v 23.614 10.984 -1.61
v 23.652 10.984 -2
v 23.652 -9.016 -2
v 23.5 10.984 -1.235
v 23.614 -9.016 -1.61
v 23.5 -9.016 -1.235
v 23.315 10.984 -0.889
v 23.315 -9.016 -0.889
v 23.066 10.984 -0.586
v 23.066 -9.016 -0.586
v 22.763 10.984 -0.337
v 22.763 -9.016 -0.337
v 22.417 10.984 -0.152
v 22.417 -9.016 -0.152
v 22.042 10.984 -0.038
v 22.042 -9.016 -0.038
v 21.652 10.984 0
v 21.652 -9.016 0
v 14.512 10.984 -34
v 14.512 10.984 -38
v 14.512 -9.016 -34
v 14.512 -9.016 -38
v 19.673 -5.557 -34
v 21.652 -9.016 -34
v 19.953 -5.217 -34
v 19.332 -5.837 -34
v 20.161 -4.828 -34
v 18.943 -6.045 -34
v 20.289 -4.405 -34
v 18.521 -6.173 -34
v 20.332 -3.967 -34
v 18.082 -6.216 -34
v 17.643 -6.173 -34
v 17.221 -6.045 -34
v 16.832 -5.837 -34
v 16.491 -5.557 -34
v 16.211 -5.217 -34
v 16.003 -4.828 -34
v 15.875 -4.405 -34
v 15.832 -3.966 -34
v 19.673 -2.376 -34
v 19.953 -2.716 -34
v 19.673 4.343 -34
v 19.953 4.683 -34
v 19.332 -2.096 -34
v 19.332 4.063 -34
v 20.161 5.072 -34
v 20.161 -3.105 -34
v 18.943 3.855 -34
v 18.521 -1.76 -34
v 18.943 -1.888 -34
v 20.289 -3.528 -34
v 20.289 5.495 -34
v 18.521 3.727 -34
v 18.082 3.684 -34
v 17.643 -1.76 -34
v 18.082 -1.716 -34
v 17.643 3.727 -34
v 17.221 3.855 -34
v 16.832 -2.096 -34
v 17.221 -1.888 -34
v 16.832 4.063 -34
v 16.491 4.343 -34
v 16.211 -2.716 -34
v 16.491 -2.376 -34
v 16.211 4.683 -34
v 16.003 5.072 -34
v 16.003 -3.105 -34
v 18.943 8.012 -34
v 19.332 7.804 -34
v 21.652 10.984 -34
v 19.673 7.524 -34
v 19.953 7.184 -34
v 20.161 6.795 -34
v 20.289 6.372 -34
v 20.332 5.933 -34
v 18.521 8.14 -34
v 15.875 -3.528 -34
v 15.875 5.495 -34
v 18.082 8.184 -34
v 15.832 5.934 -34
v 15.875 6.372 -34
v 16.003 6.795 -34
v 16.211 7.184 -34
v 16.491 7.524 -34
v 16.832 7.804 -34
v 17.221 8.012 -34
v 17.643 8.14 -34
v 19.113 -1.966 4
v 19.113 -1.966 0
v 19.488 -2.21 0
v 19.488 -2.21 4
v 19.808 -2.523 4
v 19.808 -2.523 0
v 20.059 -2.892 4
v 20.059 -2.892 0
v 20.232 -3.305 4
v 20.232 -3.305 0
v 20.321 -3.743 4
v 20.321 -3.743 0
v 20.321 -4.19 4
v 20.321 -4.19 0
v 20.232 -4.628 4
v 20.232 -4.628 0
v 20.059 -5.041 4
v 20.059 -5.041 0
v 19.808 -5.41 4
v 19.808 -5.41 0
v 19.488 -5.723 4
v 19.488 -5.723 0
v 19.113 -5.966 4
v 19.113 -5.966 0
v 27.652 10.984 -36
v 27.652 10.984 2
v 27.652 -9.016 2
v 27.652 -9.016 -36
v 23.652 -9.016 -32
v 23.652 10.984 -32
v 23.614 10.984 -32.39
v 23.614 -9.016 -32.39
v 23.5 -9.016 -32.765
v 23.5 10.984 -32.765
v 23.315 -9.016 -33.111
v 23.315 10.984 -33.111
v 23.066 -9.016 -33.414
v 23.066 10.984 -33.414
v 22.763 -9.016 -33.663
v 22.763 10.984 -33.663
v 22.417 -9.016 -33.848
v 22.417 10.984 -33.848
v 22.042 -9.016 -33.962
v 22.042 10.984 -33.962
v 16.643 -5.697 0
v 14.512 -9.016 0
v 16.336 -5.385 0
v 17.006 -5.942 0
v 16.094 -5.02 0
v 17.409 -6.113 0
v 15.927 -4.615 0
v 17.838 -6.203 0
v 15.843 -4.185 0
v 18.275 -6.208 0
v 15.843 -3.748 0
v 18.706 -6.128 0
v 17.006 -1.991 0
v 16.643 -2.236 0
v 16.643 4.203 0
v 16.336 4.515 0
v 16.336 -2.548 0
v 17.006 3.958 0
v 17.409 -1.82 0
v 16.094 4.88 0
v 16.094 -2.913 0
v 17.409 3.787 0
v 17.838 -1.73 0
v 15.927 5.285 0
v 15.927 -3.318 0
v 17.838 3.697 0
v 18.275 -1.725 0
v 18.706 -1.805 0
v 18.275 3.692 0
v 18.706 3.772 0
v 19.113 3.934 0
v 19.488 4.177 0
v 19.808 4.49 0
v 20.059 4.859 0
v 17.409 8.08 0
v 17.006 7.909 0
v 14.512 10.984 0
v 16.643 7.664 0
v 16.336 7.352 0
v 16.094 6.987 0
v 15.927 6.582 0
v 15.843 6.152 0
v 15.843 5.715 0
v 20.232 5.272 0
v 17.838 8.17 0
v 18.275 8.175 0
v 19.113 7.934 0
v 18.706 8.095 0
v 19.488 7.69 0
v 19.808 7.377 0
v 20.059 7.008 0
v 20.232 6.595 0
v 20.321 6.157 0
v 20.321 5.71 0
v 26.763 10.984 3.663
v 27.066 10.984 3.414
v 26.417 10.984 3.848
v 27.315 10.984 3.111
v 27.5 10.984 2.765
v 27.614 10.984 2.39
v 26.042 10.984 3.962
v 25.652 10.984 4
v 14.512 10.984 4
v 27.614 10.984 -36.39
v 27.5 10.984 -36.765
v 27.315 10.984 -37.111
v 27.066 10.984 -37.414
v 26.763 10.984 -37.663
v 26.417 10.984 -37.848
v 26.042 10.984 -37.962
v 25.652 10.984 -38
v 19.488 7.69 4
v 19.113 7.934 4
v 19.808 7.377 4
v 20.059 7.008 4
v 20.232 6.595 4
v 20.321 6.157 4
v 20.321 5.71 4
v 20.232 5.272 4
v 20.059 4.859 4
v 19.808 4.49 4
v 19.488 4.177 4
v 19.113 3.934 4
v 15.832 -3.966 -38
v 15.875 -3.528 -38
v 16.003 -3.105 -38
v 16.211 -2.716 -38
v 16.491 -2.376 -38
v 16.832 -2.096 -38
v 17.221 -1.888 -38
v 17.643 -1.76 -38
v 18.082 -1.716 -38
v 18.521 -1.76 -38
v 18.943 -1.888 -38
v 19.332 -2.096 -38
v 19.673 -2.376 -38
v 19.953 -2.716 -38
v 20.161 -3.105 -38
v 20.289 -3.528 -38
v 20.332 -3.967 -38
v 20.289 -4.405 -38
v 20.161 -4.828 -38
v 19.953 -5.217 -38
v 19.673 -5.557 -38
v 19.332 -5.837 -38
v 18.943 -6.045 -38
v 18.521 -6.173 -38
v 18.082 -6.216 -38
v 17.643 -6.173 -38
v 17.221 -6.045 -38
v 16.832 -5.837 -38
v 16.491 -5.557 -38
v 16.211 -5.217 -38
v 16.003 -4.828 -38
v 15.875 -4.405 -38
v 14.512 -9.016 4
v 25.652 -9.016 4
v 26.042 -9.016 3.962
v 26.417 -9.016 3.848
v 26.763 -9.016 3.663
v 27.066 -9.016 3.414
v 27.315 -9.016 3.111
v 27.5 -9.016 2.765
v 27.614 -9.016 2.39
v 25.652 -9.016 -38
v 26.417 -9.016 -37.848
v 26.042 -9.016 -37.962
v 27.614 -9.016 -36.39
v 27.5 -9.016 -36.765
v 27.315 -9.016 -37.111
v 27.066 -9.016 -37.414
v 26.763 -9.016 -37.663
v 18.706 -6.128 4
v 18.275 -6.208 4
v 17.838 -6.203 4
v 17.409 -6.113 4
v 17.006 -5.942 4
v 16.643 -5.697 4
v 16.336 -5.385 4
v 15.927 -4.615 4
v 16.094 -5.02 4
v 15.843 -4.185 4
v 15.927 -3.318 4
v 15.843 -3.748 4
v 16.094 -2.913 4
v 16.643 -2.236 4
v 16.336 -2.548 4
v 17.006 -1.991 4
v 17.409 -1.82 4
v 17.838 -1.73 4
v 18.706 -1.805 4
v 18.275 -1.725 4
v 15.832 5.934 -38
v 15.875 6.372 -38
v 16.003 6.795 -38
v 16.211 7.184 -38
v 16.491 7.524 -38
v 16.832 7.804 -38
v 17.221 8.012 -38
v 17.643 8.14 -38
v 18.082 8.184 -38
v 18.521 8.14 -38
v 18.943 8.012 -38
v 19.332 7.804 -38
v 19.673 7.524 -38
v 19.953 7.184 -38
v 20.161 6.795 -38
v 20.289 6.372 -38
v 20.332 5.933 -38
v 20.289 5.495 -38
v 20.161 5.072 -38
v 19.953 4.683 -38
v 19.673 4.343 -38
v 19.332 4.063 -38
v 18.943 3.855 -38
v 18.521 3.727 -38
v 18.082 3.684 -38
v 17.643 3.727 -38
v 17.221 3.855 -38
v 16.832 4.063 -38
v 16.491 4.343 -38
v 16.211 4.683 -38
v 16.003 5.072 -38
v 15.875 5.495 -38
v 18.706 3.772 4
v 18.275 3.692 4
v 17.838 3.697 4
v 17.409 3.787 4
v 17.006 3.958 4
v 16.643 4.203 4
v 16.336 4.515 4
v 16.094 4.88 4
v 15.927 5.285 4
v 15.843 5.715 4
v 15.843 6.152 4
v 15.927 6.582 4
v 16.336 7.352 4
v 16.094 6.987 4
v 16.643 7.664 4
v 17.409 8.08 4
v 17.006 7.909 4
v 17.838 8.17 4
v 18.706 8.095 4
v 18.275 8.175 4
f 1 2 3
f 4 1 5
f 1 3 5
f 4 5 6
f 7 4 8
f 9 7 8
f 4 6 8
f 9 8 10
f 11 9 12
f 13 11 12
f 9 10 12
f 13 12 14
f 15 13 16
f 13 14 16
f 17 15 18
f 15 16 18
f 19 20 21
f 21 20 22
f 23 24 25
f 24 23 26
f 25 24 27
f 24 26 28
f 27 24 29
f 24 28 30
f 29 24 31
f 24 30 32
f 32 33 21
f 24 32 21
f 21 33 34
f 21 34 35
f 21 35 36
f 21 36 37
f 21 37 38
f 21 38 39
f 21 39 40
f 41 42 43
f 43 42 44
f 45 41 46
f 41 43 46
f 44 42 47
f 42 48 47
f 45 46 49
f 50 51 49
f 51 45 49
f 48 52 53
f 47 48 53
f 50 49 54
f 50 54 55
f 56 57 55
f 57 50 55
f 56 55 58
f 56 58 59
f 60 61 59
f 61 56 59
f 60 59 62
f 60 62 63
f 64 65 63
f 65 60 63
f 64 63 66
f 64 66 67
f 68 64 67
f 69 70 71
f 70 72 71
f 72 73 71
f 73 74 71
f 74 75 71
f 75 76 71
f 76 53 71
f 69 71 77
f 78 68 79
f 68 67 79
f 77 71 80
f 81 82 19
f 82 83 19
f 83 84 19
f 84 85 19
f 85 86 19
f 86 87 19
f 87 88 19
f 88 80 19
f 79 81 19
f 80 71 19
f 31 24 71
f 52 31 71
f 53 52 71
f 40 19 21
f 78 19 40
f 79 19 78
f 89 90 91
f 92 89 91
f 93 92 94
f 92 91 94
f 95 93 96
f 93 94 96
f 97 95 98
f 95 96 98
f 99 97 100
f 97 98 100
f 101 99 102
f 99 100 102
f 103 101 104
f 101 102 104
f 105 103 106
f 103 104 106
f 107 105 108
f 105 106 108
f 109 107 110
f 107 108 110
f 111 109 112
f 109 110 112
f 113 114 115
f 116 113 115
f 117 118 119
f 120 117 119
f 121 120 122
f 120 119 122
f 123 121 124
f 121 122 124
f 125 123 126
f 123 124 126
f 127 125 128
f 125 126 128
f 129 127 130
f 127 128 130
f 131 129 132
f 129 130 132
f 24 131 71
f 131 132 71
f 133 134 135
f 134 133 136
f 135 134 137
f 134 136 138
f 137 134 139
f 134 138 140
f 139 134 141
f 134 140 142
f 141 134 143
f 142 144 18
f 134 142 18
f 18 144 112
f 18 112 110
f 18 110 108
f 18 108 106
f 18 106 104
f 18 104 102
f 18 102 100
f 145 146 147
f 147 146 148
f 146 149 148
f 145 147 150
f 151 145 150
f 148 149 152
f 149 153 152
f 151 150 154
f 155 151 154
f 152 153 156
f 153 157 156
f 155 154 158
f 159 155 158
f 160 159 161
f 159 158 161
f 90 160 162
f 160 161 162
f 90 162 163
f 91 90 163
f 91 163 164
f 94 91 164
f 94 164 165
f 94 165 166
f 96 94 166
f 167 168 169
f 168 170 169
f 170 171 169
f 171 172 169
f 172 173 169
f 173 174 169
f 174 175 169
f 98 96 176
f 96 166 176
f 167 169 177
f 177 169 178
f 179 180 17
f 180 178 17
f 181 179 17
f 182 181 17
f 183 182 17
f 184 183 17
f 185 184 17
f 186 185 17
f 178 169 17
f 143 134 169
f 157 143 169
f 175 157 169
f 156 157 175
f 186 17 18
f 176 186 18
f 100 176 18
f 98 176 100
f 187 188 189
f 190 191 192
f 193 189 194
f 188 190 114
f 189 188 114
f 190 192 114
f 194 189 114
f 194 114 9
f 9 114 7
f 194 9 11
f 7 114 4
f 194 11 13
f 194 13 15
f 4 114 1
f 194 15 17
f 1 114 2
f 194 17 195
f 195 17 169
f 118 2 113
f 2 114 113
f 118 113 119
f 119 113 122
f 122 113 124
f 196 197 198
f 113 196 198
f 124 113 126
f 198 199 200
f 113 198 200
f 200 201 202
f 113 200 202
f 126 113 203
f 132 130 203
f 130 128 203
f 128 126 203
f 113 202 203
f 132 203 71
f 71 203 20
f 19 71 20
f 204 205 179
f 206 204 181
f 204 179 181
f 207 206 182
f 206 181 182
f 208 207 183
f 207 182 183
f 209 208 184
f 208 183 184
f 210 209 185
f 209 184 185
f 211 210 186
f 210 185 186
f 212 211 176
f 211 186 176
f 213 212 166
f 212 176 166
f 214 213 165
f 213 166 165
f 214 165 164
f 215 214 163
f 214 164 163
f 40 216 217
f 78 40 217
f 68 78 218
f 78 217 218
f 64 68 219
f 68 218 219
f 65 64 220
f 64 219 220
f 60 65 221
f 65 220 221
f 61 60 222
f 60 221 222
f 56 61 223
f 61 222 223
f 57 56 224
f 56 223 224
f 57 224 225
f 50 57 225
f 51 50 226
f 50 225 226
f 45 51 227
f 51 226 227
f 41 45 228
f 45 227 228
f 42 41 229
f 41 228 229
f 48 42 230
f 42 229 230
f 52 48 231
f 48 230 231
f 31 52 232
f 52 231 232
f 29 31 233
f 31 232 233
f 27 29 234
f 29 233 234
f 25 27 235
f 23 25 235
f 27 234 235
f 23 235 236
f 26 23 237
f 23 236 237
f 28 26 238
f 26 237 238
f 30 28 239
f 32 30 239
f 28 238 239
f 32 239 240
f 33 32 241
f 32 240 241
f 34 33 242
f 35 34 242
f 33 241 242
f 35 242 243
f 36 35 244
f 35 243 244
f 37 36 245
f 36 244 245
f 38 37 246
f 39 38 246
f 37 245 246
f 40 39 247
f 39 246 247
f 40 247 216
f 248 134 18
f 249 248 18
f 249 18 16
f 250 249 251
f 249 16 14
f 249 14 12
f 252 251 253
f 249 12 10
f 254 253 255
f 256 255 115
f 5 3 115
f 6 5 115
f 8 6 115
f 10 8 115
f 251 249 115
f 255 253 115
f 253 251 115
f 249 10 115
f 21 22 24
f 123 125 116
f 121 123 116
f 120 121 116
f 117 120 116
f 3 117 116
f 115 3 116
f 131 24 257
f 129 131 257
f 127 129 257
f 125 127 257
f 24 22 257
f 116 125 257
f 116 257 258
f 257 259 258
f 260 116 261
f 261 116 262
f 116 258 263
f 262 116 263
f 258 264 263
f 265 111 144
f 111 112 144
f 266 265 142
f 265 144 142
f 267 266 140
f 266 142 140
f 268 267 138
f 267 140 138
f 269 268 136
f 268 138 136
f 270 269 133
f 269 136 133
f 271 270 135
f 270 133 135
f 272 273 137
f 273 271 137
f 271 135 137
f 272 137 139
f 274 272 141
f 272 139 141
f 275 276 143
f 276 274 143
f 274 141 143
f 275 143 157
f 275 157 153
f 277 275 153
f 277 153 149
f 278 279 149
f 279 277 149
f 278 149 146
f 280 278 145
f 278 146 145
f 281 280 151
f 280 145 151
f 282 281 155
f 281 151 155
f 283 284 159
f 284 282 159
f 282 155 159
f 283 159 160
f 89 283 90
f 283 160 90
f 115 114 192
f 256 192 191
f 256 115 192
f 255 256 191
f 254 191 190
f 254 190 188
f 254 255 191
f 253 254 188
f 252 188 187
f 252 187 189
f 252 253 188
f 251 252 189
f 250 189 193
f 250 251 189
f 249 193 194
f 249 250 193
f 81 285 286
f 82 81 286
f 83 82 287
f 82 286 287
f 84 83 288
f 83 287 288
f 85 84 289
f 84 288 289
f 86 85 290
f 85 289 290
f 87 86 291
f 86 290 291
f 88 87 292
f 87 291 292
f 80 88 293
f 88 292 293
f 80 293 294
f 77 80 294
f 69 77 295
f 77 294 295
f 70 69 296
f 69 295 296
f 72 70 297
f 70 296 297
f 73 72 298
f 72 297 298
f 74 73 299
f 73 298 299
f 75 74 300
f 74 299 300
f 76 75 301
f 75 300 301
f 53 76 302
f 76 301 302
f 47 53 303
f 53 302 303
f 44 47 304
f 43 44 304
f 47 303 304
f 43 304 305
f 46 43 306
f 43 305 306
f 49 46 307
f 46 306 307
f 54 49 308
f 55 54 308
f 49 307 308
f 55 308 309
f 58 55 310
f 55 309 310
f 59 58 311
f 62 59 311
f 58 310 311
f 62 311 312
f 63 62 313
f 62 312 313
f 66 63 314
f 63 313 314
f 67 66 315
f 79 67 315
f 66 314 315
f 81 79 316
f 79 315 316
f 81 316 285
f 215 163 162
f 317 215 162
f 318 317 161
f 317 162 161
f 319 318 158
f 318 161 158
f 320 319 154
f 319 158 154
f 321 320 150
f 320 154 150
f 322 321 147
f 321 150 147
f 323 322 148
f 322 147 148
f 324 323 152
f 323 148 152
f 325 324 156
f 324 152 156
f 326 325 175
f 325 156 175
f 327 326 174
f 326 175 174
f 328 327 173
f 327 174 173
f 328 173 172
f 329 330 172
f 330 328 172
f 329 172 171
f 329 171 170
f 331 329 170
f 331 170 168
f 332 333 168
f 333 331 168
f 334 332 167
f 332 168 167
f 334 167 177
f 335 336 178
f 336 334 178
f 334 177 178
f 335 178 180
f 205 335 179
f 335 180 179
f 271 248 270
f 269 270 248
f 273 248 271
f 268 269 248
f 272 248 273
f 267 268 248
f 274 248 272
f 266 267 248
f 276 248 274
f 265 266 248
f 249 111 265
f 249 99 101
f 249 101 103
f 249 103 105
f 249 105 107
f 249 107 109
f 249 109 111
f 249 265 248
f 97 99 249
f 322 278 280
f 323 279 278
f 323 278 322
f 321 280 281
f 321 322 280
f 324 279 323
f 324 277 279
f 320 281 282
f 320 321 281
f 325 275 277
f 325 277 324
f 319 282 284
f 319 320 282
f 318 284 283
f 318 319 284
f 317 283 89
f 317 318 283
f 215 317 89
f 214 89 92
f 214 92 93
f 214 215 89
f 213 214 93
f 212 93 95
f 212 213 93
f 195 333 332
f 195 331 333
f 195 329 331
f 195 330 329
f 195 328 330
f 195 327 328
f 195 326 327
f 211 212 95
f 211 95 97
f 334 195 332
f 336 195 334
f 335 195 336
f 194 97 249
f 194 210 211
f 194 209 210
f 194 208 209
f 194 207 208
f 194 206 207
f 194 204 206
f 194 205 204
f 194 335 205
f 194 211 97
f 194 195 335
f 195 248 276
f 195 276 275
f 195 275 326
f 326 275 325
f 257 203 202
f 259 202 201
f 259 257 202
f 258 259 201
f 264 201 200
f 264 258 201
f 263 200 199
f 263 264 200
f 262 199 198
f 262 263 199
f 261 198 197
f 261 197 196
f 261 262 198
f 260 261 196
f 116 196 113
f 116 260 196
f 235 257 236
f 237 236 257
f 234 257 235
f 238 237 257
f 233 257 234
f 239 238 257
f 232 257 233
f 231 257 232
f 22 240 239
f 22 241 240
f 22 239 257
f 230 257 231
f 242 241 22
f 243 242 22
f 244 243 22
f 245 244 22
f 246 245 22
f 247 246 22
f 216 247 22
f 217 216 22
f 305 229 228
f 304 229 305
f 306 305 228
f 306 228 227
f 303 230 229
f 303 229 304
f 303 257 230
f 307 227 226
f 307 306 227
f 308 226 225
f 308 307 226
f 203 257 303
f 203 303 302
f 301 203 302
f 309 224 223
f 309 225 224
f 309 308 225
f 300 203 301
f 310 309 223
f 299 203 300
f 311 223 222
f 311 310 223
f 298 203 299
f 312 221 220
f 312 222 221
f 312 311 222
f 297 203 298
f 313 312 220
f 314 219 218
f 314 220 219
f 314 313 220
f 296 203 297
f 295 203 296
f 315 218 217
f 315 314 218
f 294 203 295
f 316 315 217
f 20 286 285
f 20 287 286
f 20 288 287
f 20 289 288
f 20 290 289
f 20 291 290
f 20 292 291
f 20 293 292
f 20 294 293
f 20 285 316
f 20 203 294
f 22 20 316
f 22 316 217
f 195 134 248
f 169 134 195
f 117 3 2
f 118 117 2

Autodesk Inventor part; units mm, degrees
ref_plane "YZ Plane" through (0, 0, 0) normal (1, 0, 0) x (0, 1, 0)
ref_plane "XZ Plane" through (0, 0, 0) normal (0, 1, 0) x (-1, 0, 0)
ref_plane "XY Plane" through (0, 0, 0) normal (0, 0, 1) x (1, 0, 0)
sketch "Эскиз1" plane through (0, 0, 0) normal (0, 0, 1) x (1, 0, 0)
  line L0 (21.232, 7.9335) -> (21.232, 9.4835)
  arc A0 (21.232, 9.4835) -> (19.732, 10.9835) centre (19.732, 9.4835) ccw
  line L1 (19.732, 10.9835) -> (-31.568, 10.9835)
  line L2 (-31.568, -9.0165) -> (19.732, -9.0165)
  arc A1 (19.732, -9.0165) -> (21.232, -7.5165) centre (19.732, -7.5165) ccw
  line L3 (21.232, -7.5165) -> (21.232, -5.9665)
  line L4 (21.232, -5.9665) -> (19.1128, -5.9665)
  arc A2 (19.1128, -1.9665) -> (19.1128, -5.9665) centre (18.082, -3.9665) ccw
  line L5 (19.1128, -1.9665) -> (21.232, -1.9665)
  line L6 (21.232, -1.9665) -> (21.232, 3.9335)
  line L7 (21.232, 3.9335) -> (19.1128, 3.9335)
  arc A3 (19.1128, 7.9335) -> (19.1128, 3.9335) centre (18.082, 5.9335) ccw
  line L8 (19.1128, 7.9335) -> (21.232, 7.9335)
  line L9 (-24.768, -8.9965) -> (13.532, -8.9965)
  line L10 (13.532, 10.9635) -> (-24.768, 10.9635)
  arc A4 (14.512, 9.9835) -> (13.532, 10.9635) centre (13.532, 9.9835) ccw
  line L11 (14.512, -8.0165) -> (14.512, 9.9835)
  arc A5 (13.532, -8.9965) -> (14.512, -8.0165) centre (13.532, -8.0165) ccw
  line L12 (14.512, 9.9835) -> (14.512, 13.5721)
  line L13 (21.652, -9.0165) -> (14.512, -9.0165)
  line L14 (14.512, -9.0165) -> (14.512, 10.9835)
  line L15 (14.512, 10.9835) -> (21.652, 10.9835)
  line L16 (21.652, 10.9835) -> (21.652, -9.0165)
  line L17 (21.652, -9.0165) -> (14.512, 10.9835) construction
  line L18 (14.512, -9.0165) -> (21.652, 10.9835) construction
  circle A6 centre (18.082, 5.9335) radius 2.25
  circle A7 centre (18.082, -3.9665) radius 2.25
  line L19 (21.652, 10.9835) -> (23.652, 10.9835)
  line L20 (23.652, 10.9835) -> (23.652, -9.0165)
  line L21 (23.652, -9.0165) -> (21.652, -9.0165)
  line L22 (21.652, -9.0165) -> (21.652, 10.9835)
  point P0 (0, 0)
  point P1 (-5.918, 0.9835)
  point P2 (18.082, 0.9835)
  point P3 (19.1128, -5.9665)
  point P4 (19.732, -9.0165)
  dimension "d2" = 2
extrude "Выдавливание1" add sketch "Эскиз1" along normal blind 4 contours L8 A3 L7 L6 L5 A2 L4 L3 A1 L2 L14 L11 L12 L1 A0 L0 | L0 A0 L15 L16 L13 A1 L3 L4 A7 L5 L6 L7 A6 L8 | L19 L20 L21 L16
sketch "Эскиз2" plane through (0, 0, 4) normal (0, 0, 1) x (1, 0, 0)
  line L0 (23.652, 10.9835) -> (14.512, 10.9835) projected
  line L1 (14.512, 10.9835) -> (14.512, -9.0165) projected
  line L2 (14.512, -9.0165) -> (23.652, -9.0165) projected
  line L3 (23.652, -9.0165) -> (23.652, 10.9835) projected
  circle A0 centre (18.082, -3.9665) radius 2.25 projected
  circle A1 centre (18.082, 5.9335) radius 2.25 projected
  line L4 (23.652, 10.9835) -> (27.652, 10.9835)
  line L5 (27.652, 10.9835) -> (27.652, -9.0165)
  line L6 (27.652, -9.0165) -> (23.652, -9.0165)
  line L7 (23.652, -9.0165) -> (23.652, 10.9835)
  point P0 (0, 0)
  dimension "d3" = 4
extrude "Выдавливание2" add sketch "Эскиз2" against normal blind 42 contours L4 L5 L6 L3
sketch "Эскиз3" plane through (0, 0, -38) normal (0, 0, -1) x (-1, 0, 0)
  line L0 (-23.652, 10.9835) -> (-14.512, 10.9835) projected
  line L1 (-23.652, -9.0165) -> (-23.652, 10.9835) projected
  line L2 (-14.512, -9.0165) -> (-23.652, -9.0165) projected
  line L3 (-14.512, 10.9835) -> (-14.512, -9.0165) projected
  circle A0 centre (-18.082, -3.9665) radius 2.25 projected
  circle A1 centre (-18.082, 5.9335) radius 2.25 projected
  point P0 (0, 0)
extrude "Выдавливание3" add sketch "Эскиз3" against normal blind 4
fillet "Сопряжение1" radius 2 4 edges at (23.652, 0.9835, 0) (23.652, 0.9835, -34) (27.652, 0.9835, -38) (27.652, 0.9835, 4)
properties part number "крепл сервы на пуляло"
